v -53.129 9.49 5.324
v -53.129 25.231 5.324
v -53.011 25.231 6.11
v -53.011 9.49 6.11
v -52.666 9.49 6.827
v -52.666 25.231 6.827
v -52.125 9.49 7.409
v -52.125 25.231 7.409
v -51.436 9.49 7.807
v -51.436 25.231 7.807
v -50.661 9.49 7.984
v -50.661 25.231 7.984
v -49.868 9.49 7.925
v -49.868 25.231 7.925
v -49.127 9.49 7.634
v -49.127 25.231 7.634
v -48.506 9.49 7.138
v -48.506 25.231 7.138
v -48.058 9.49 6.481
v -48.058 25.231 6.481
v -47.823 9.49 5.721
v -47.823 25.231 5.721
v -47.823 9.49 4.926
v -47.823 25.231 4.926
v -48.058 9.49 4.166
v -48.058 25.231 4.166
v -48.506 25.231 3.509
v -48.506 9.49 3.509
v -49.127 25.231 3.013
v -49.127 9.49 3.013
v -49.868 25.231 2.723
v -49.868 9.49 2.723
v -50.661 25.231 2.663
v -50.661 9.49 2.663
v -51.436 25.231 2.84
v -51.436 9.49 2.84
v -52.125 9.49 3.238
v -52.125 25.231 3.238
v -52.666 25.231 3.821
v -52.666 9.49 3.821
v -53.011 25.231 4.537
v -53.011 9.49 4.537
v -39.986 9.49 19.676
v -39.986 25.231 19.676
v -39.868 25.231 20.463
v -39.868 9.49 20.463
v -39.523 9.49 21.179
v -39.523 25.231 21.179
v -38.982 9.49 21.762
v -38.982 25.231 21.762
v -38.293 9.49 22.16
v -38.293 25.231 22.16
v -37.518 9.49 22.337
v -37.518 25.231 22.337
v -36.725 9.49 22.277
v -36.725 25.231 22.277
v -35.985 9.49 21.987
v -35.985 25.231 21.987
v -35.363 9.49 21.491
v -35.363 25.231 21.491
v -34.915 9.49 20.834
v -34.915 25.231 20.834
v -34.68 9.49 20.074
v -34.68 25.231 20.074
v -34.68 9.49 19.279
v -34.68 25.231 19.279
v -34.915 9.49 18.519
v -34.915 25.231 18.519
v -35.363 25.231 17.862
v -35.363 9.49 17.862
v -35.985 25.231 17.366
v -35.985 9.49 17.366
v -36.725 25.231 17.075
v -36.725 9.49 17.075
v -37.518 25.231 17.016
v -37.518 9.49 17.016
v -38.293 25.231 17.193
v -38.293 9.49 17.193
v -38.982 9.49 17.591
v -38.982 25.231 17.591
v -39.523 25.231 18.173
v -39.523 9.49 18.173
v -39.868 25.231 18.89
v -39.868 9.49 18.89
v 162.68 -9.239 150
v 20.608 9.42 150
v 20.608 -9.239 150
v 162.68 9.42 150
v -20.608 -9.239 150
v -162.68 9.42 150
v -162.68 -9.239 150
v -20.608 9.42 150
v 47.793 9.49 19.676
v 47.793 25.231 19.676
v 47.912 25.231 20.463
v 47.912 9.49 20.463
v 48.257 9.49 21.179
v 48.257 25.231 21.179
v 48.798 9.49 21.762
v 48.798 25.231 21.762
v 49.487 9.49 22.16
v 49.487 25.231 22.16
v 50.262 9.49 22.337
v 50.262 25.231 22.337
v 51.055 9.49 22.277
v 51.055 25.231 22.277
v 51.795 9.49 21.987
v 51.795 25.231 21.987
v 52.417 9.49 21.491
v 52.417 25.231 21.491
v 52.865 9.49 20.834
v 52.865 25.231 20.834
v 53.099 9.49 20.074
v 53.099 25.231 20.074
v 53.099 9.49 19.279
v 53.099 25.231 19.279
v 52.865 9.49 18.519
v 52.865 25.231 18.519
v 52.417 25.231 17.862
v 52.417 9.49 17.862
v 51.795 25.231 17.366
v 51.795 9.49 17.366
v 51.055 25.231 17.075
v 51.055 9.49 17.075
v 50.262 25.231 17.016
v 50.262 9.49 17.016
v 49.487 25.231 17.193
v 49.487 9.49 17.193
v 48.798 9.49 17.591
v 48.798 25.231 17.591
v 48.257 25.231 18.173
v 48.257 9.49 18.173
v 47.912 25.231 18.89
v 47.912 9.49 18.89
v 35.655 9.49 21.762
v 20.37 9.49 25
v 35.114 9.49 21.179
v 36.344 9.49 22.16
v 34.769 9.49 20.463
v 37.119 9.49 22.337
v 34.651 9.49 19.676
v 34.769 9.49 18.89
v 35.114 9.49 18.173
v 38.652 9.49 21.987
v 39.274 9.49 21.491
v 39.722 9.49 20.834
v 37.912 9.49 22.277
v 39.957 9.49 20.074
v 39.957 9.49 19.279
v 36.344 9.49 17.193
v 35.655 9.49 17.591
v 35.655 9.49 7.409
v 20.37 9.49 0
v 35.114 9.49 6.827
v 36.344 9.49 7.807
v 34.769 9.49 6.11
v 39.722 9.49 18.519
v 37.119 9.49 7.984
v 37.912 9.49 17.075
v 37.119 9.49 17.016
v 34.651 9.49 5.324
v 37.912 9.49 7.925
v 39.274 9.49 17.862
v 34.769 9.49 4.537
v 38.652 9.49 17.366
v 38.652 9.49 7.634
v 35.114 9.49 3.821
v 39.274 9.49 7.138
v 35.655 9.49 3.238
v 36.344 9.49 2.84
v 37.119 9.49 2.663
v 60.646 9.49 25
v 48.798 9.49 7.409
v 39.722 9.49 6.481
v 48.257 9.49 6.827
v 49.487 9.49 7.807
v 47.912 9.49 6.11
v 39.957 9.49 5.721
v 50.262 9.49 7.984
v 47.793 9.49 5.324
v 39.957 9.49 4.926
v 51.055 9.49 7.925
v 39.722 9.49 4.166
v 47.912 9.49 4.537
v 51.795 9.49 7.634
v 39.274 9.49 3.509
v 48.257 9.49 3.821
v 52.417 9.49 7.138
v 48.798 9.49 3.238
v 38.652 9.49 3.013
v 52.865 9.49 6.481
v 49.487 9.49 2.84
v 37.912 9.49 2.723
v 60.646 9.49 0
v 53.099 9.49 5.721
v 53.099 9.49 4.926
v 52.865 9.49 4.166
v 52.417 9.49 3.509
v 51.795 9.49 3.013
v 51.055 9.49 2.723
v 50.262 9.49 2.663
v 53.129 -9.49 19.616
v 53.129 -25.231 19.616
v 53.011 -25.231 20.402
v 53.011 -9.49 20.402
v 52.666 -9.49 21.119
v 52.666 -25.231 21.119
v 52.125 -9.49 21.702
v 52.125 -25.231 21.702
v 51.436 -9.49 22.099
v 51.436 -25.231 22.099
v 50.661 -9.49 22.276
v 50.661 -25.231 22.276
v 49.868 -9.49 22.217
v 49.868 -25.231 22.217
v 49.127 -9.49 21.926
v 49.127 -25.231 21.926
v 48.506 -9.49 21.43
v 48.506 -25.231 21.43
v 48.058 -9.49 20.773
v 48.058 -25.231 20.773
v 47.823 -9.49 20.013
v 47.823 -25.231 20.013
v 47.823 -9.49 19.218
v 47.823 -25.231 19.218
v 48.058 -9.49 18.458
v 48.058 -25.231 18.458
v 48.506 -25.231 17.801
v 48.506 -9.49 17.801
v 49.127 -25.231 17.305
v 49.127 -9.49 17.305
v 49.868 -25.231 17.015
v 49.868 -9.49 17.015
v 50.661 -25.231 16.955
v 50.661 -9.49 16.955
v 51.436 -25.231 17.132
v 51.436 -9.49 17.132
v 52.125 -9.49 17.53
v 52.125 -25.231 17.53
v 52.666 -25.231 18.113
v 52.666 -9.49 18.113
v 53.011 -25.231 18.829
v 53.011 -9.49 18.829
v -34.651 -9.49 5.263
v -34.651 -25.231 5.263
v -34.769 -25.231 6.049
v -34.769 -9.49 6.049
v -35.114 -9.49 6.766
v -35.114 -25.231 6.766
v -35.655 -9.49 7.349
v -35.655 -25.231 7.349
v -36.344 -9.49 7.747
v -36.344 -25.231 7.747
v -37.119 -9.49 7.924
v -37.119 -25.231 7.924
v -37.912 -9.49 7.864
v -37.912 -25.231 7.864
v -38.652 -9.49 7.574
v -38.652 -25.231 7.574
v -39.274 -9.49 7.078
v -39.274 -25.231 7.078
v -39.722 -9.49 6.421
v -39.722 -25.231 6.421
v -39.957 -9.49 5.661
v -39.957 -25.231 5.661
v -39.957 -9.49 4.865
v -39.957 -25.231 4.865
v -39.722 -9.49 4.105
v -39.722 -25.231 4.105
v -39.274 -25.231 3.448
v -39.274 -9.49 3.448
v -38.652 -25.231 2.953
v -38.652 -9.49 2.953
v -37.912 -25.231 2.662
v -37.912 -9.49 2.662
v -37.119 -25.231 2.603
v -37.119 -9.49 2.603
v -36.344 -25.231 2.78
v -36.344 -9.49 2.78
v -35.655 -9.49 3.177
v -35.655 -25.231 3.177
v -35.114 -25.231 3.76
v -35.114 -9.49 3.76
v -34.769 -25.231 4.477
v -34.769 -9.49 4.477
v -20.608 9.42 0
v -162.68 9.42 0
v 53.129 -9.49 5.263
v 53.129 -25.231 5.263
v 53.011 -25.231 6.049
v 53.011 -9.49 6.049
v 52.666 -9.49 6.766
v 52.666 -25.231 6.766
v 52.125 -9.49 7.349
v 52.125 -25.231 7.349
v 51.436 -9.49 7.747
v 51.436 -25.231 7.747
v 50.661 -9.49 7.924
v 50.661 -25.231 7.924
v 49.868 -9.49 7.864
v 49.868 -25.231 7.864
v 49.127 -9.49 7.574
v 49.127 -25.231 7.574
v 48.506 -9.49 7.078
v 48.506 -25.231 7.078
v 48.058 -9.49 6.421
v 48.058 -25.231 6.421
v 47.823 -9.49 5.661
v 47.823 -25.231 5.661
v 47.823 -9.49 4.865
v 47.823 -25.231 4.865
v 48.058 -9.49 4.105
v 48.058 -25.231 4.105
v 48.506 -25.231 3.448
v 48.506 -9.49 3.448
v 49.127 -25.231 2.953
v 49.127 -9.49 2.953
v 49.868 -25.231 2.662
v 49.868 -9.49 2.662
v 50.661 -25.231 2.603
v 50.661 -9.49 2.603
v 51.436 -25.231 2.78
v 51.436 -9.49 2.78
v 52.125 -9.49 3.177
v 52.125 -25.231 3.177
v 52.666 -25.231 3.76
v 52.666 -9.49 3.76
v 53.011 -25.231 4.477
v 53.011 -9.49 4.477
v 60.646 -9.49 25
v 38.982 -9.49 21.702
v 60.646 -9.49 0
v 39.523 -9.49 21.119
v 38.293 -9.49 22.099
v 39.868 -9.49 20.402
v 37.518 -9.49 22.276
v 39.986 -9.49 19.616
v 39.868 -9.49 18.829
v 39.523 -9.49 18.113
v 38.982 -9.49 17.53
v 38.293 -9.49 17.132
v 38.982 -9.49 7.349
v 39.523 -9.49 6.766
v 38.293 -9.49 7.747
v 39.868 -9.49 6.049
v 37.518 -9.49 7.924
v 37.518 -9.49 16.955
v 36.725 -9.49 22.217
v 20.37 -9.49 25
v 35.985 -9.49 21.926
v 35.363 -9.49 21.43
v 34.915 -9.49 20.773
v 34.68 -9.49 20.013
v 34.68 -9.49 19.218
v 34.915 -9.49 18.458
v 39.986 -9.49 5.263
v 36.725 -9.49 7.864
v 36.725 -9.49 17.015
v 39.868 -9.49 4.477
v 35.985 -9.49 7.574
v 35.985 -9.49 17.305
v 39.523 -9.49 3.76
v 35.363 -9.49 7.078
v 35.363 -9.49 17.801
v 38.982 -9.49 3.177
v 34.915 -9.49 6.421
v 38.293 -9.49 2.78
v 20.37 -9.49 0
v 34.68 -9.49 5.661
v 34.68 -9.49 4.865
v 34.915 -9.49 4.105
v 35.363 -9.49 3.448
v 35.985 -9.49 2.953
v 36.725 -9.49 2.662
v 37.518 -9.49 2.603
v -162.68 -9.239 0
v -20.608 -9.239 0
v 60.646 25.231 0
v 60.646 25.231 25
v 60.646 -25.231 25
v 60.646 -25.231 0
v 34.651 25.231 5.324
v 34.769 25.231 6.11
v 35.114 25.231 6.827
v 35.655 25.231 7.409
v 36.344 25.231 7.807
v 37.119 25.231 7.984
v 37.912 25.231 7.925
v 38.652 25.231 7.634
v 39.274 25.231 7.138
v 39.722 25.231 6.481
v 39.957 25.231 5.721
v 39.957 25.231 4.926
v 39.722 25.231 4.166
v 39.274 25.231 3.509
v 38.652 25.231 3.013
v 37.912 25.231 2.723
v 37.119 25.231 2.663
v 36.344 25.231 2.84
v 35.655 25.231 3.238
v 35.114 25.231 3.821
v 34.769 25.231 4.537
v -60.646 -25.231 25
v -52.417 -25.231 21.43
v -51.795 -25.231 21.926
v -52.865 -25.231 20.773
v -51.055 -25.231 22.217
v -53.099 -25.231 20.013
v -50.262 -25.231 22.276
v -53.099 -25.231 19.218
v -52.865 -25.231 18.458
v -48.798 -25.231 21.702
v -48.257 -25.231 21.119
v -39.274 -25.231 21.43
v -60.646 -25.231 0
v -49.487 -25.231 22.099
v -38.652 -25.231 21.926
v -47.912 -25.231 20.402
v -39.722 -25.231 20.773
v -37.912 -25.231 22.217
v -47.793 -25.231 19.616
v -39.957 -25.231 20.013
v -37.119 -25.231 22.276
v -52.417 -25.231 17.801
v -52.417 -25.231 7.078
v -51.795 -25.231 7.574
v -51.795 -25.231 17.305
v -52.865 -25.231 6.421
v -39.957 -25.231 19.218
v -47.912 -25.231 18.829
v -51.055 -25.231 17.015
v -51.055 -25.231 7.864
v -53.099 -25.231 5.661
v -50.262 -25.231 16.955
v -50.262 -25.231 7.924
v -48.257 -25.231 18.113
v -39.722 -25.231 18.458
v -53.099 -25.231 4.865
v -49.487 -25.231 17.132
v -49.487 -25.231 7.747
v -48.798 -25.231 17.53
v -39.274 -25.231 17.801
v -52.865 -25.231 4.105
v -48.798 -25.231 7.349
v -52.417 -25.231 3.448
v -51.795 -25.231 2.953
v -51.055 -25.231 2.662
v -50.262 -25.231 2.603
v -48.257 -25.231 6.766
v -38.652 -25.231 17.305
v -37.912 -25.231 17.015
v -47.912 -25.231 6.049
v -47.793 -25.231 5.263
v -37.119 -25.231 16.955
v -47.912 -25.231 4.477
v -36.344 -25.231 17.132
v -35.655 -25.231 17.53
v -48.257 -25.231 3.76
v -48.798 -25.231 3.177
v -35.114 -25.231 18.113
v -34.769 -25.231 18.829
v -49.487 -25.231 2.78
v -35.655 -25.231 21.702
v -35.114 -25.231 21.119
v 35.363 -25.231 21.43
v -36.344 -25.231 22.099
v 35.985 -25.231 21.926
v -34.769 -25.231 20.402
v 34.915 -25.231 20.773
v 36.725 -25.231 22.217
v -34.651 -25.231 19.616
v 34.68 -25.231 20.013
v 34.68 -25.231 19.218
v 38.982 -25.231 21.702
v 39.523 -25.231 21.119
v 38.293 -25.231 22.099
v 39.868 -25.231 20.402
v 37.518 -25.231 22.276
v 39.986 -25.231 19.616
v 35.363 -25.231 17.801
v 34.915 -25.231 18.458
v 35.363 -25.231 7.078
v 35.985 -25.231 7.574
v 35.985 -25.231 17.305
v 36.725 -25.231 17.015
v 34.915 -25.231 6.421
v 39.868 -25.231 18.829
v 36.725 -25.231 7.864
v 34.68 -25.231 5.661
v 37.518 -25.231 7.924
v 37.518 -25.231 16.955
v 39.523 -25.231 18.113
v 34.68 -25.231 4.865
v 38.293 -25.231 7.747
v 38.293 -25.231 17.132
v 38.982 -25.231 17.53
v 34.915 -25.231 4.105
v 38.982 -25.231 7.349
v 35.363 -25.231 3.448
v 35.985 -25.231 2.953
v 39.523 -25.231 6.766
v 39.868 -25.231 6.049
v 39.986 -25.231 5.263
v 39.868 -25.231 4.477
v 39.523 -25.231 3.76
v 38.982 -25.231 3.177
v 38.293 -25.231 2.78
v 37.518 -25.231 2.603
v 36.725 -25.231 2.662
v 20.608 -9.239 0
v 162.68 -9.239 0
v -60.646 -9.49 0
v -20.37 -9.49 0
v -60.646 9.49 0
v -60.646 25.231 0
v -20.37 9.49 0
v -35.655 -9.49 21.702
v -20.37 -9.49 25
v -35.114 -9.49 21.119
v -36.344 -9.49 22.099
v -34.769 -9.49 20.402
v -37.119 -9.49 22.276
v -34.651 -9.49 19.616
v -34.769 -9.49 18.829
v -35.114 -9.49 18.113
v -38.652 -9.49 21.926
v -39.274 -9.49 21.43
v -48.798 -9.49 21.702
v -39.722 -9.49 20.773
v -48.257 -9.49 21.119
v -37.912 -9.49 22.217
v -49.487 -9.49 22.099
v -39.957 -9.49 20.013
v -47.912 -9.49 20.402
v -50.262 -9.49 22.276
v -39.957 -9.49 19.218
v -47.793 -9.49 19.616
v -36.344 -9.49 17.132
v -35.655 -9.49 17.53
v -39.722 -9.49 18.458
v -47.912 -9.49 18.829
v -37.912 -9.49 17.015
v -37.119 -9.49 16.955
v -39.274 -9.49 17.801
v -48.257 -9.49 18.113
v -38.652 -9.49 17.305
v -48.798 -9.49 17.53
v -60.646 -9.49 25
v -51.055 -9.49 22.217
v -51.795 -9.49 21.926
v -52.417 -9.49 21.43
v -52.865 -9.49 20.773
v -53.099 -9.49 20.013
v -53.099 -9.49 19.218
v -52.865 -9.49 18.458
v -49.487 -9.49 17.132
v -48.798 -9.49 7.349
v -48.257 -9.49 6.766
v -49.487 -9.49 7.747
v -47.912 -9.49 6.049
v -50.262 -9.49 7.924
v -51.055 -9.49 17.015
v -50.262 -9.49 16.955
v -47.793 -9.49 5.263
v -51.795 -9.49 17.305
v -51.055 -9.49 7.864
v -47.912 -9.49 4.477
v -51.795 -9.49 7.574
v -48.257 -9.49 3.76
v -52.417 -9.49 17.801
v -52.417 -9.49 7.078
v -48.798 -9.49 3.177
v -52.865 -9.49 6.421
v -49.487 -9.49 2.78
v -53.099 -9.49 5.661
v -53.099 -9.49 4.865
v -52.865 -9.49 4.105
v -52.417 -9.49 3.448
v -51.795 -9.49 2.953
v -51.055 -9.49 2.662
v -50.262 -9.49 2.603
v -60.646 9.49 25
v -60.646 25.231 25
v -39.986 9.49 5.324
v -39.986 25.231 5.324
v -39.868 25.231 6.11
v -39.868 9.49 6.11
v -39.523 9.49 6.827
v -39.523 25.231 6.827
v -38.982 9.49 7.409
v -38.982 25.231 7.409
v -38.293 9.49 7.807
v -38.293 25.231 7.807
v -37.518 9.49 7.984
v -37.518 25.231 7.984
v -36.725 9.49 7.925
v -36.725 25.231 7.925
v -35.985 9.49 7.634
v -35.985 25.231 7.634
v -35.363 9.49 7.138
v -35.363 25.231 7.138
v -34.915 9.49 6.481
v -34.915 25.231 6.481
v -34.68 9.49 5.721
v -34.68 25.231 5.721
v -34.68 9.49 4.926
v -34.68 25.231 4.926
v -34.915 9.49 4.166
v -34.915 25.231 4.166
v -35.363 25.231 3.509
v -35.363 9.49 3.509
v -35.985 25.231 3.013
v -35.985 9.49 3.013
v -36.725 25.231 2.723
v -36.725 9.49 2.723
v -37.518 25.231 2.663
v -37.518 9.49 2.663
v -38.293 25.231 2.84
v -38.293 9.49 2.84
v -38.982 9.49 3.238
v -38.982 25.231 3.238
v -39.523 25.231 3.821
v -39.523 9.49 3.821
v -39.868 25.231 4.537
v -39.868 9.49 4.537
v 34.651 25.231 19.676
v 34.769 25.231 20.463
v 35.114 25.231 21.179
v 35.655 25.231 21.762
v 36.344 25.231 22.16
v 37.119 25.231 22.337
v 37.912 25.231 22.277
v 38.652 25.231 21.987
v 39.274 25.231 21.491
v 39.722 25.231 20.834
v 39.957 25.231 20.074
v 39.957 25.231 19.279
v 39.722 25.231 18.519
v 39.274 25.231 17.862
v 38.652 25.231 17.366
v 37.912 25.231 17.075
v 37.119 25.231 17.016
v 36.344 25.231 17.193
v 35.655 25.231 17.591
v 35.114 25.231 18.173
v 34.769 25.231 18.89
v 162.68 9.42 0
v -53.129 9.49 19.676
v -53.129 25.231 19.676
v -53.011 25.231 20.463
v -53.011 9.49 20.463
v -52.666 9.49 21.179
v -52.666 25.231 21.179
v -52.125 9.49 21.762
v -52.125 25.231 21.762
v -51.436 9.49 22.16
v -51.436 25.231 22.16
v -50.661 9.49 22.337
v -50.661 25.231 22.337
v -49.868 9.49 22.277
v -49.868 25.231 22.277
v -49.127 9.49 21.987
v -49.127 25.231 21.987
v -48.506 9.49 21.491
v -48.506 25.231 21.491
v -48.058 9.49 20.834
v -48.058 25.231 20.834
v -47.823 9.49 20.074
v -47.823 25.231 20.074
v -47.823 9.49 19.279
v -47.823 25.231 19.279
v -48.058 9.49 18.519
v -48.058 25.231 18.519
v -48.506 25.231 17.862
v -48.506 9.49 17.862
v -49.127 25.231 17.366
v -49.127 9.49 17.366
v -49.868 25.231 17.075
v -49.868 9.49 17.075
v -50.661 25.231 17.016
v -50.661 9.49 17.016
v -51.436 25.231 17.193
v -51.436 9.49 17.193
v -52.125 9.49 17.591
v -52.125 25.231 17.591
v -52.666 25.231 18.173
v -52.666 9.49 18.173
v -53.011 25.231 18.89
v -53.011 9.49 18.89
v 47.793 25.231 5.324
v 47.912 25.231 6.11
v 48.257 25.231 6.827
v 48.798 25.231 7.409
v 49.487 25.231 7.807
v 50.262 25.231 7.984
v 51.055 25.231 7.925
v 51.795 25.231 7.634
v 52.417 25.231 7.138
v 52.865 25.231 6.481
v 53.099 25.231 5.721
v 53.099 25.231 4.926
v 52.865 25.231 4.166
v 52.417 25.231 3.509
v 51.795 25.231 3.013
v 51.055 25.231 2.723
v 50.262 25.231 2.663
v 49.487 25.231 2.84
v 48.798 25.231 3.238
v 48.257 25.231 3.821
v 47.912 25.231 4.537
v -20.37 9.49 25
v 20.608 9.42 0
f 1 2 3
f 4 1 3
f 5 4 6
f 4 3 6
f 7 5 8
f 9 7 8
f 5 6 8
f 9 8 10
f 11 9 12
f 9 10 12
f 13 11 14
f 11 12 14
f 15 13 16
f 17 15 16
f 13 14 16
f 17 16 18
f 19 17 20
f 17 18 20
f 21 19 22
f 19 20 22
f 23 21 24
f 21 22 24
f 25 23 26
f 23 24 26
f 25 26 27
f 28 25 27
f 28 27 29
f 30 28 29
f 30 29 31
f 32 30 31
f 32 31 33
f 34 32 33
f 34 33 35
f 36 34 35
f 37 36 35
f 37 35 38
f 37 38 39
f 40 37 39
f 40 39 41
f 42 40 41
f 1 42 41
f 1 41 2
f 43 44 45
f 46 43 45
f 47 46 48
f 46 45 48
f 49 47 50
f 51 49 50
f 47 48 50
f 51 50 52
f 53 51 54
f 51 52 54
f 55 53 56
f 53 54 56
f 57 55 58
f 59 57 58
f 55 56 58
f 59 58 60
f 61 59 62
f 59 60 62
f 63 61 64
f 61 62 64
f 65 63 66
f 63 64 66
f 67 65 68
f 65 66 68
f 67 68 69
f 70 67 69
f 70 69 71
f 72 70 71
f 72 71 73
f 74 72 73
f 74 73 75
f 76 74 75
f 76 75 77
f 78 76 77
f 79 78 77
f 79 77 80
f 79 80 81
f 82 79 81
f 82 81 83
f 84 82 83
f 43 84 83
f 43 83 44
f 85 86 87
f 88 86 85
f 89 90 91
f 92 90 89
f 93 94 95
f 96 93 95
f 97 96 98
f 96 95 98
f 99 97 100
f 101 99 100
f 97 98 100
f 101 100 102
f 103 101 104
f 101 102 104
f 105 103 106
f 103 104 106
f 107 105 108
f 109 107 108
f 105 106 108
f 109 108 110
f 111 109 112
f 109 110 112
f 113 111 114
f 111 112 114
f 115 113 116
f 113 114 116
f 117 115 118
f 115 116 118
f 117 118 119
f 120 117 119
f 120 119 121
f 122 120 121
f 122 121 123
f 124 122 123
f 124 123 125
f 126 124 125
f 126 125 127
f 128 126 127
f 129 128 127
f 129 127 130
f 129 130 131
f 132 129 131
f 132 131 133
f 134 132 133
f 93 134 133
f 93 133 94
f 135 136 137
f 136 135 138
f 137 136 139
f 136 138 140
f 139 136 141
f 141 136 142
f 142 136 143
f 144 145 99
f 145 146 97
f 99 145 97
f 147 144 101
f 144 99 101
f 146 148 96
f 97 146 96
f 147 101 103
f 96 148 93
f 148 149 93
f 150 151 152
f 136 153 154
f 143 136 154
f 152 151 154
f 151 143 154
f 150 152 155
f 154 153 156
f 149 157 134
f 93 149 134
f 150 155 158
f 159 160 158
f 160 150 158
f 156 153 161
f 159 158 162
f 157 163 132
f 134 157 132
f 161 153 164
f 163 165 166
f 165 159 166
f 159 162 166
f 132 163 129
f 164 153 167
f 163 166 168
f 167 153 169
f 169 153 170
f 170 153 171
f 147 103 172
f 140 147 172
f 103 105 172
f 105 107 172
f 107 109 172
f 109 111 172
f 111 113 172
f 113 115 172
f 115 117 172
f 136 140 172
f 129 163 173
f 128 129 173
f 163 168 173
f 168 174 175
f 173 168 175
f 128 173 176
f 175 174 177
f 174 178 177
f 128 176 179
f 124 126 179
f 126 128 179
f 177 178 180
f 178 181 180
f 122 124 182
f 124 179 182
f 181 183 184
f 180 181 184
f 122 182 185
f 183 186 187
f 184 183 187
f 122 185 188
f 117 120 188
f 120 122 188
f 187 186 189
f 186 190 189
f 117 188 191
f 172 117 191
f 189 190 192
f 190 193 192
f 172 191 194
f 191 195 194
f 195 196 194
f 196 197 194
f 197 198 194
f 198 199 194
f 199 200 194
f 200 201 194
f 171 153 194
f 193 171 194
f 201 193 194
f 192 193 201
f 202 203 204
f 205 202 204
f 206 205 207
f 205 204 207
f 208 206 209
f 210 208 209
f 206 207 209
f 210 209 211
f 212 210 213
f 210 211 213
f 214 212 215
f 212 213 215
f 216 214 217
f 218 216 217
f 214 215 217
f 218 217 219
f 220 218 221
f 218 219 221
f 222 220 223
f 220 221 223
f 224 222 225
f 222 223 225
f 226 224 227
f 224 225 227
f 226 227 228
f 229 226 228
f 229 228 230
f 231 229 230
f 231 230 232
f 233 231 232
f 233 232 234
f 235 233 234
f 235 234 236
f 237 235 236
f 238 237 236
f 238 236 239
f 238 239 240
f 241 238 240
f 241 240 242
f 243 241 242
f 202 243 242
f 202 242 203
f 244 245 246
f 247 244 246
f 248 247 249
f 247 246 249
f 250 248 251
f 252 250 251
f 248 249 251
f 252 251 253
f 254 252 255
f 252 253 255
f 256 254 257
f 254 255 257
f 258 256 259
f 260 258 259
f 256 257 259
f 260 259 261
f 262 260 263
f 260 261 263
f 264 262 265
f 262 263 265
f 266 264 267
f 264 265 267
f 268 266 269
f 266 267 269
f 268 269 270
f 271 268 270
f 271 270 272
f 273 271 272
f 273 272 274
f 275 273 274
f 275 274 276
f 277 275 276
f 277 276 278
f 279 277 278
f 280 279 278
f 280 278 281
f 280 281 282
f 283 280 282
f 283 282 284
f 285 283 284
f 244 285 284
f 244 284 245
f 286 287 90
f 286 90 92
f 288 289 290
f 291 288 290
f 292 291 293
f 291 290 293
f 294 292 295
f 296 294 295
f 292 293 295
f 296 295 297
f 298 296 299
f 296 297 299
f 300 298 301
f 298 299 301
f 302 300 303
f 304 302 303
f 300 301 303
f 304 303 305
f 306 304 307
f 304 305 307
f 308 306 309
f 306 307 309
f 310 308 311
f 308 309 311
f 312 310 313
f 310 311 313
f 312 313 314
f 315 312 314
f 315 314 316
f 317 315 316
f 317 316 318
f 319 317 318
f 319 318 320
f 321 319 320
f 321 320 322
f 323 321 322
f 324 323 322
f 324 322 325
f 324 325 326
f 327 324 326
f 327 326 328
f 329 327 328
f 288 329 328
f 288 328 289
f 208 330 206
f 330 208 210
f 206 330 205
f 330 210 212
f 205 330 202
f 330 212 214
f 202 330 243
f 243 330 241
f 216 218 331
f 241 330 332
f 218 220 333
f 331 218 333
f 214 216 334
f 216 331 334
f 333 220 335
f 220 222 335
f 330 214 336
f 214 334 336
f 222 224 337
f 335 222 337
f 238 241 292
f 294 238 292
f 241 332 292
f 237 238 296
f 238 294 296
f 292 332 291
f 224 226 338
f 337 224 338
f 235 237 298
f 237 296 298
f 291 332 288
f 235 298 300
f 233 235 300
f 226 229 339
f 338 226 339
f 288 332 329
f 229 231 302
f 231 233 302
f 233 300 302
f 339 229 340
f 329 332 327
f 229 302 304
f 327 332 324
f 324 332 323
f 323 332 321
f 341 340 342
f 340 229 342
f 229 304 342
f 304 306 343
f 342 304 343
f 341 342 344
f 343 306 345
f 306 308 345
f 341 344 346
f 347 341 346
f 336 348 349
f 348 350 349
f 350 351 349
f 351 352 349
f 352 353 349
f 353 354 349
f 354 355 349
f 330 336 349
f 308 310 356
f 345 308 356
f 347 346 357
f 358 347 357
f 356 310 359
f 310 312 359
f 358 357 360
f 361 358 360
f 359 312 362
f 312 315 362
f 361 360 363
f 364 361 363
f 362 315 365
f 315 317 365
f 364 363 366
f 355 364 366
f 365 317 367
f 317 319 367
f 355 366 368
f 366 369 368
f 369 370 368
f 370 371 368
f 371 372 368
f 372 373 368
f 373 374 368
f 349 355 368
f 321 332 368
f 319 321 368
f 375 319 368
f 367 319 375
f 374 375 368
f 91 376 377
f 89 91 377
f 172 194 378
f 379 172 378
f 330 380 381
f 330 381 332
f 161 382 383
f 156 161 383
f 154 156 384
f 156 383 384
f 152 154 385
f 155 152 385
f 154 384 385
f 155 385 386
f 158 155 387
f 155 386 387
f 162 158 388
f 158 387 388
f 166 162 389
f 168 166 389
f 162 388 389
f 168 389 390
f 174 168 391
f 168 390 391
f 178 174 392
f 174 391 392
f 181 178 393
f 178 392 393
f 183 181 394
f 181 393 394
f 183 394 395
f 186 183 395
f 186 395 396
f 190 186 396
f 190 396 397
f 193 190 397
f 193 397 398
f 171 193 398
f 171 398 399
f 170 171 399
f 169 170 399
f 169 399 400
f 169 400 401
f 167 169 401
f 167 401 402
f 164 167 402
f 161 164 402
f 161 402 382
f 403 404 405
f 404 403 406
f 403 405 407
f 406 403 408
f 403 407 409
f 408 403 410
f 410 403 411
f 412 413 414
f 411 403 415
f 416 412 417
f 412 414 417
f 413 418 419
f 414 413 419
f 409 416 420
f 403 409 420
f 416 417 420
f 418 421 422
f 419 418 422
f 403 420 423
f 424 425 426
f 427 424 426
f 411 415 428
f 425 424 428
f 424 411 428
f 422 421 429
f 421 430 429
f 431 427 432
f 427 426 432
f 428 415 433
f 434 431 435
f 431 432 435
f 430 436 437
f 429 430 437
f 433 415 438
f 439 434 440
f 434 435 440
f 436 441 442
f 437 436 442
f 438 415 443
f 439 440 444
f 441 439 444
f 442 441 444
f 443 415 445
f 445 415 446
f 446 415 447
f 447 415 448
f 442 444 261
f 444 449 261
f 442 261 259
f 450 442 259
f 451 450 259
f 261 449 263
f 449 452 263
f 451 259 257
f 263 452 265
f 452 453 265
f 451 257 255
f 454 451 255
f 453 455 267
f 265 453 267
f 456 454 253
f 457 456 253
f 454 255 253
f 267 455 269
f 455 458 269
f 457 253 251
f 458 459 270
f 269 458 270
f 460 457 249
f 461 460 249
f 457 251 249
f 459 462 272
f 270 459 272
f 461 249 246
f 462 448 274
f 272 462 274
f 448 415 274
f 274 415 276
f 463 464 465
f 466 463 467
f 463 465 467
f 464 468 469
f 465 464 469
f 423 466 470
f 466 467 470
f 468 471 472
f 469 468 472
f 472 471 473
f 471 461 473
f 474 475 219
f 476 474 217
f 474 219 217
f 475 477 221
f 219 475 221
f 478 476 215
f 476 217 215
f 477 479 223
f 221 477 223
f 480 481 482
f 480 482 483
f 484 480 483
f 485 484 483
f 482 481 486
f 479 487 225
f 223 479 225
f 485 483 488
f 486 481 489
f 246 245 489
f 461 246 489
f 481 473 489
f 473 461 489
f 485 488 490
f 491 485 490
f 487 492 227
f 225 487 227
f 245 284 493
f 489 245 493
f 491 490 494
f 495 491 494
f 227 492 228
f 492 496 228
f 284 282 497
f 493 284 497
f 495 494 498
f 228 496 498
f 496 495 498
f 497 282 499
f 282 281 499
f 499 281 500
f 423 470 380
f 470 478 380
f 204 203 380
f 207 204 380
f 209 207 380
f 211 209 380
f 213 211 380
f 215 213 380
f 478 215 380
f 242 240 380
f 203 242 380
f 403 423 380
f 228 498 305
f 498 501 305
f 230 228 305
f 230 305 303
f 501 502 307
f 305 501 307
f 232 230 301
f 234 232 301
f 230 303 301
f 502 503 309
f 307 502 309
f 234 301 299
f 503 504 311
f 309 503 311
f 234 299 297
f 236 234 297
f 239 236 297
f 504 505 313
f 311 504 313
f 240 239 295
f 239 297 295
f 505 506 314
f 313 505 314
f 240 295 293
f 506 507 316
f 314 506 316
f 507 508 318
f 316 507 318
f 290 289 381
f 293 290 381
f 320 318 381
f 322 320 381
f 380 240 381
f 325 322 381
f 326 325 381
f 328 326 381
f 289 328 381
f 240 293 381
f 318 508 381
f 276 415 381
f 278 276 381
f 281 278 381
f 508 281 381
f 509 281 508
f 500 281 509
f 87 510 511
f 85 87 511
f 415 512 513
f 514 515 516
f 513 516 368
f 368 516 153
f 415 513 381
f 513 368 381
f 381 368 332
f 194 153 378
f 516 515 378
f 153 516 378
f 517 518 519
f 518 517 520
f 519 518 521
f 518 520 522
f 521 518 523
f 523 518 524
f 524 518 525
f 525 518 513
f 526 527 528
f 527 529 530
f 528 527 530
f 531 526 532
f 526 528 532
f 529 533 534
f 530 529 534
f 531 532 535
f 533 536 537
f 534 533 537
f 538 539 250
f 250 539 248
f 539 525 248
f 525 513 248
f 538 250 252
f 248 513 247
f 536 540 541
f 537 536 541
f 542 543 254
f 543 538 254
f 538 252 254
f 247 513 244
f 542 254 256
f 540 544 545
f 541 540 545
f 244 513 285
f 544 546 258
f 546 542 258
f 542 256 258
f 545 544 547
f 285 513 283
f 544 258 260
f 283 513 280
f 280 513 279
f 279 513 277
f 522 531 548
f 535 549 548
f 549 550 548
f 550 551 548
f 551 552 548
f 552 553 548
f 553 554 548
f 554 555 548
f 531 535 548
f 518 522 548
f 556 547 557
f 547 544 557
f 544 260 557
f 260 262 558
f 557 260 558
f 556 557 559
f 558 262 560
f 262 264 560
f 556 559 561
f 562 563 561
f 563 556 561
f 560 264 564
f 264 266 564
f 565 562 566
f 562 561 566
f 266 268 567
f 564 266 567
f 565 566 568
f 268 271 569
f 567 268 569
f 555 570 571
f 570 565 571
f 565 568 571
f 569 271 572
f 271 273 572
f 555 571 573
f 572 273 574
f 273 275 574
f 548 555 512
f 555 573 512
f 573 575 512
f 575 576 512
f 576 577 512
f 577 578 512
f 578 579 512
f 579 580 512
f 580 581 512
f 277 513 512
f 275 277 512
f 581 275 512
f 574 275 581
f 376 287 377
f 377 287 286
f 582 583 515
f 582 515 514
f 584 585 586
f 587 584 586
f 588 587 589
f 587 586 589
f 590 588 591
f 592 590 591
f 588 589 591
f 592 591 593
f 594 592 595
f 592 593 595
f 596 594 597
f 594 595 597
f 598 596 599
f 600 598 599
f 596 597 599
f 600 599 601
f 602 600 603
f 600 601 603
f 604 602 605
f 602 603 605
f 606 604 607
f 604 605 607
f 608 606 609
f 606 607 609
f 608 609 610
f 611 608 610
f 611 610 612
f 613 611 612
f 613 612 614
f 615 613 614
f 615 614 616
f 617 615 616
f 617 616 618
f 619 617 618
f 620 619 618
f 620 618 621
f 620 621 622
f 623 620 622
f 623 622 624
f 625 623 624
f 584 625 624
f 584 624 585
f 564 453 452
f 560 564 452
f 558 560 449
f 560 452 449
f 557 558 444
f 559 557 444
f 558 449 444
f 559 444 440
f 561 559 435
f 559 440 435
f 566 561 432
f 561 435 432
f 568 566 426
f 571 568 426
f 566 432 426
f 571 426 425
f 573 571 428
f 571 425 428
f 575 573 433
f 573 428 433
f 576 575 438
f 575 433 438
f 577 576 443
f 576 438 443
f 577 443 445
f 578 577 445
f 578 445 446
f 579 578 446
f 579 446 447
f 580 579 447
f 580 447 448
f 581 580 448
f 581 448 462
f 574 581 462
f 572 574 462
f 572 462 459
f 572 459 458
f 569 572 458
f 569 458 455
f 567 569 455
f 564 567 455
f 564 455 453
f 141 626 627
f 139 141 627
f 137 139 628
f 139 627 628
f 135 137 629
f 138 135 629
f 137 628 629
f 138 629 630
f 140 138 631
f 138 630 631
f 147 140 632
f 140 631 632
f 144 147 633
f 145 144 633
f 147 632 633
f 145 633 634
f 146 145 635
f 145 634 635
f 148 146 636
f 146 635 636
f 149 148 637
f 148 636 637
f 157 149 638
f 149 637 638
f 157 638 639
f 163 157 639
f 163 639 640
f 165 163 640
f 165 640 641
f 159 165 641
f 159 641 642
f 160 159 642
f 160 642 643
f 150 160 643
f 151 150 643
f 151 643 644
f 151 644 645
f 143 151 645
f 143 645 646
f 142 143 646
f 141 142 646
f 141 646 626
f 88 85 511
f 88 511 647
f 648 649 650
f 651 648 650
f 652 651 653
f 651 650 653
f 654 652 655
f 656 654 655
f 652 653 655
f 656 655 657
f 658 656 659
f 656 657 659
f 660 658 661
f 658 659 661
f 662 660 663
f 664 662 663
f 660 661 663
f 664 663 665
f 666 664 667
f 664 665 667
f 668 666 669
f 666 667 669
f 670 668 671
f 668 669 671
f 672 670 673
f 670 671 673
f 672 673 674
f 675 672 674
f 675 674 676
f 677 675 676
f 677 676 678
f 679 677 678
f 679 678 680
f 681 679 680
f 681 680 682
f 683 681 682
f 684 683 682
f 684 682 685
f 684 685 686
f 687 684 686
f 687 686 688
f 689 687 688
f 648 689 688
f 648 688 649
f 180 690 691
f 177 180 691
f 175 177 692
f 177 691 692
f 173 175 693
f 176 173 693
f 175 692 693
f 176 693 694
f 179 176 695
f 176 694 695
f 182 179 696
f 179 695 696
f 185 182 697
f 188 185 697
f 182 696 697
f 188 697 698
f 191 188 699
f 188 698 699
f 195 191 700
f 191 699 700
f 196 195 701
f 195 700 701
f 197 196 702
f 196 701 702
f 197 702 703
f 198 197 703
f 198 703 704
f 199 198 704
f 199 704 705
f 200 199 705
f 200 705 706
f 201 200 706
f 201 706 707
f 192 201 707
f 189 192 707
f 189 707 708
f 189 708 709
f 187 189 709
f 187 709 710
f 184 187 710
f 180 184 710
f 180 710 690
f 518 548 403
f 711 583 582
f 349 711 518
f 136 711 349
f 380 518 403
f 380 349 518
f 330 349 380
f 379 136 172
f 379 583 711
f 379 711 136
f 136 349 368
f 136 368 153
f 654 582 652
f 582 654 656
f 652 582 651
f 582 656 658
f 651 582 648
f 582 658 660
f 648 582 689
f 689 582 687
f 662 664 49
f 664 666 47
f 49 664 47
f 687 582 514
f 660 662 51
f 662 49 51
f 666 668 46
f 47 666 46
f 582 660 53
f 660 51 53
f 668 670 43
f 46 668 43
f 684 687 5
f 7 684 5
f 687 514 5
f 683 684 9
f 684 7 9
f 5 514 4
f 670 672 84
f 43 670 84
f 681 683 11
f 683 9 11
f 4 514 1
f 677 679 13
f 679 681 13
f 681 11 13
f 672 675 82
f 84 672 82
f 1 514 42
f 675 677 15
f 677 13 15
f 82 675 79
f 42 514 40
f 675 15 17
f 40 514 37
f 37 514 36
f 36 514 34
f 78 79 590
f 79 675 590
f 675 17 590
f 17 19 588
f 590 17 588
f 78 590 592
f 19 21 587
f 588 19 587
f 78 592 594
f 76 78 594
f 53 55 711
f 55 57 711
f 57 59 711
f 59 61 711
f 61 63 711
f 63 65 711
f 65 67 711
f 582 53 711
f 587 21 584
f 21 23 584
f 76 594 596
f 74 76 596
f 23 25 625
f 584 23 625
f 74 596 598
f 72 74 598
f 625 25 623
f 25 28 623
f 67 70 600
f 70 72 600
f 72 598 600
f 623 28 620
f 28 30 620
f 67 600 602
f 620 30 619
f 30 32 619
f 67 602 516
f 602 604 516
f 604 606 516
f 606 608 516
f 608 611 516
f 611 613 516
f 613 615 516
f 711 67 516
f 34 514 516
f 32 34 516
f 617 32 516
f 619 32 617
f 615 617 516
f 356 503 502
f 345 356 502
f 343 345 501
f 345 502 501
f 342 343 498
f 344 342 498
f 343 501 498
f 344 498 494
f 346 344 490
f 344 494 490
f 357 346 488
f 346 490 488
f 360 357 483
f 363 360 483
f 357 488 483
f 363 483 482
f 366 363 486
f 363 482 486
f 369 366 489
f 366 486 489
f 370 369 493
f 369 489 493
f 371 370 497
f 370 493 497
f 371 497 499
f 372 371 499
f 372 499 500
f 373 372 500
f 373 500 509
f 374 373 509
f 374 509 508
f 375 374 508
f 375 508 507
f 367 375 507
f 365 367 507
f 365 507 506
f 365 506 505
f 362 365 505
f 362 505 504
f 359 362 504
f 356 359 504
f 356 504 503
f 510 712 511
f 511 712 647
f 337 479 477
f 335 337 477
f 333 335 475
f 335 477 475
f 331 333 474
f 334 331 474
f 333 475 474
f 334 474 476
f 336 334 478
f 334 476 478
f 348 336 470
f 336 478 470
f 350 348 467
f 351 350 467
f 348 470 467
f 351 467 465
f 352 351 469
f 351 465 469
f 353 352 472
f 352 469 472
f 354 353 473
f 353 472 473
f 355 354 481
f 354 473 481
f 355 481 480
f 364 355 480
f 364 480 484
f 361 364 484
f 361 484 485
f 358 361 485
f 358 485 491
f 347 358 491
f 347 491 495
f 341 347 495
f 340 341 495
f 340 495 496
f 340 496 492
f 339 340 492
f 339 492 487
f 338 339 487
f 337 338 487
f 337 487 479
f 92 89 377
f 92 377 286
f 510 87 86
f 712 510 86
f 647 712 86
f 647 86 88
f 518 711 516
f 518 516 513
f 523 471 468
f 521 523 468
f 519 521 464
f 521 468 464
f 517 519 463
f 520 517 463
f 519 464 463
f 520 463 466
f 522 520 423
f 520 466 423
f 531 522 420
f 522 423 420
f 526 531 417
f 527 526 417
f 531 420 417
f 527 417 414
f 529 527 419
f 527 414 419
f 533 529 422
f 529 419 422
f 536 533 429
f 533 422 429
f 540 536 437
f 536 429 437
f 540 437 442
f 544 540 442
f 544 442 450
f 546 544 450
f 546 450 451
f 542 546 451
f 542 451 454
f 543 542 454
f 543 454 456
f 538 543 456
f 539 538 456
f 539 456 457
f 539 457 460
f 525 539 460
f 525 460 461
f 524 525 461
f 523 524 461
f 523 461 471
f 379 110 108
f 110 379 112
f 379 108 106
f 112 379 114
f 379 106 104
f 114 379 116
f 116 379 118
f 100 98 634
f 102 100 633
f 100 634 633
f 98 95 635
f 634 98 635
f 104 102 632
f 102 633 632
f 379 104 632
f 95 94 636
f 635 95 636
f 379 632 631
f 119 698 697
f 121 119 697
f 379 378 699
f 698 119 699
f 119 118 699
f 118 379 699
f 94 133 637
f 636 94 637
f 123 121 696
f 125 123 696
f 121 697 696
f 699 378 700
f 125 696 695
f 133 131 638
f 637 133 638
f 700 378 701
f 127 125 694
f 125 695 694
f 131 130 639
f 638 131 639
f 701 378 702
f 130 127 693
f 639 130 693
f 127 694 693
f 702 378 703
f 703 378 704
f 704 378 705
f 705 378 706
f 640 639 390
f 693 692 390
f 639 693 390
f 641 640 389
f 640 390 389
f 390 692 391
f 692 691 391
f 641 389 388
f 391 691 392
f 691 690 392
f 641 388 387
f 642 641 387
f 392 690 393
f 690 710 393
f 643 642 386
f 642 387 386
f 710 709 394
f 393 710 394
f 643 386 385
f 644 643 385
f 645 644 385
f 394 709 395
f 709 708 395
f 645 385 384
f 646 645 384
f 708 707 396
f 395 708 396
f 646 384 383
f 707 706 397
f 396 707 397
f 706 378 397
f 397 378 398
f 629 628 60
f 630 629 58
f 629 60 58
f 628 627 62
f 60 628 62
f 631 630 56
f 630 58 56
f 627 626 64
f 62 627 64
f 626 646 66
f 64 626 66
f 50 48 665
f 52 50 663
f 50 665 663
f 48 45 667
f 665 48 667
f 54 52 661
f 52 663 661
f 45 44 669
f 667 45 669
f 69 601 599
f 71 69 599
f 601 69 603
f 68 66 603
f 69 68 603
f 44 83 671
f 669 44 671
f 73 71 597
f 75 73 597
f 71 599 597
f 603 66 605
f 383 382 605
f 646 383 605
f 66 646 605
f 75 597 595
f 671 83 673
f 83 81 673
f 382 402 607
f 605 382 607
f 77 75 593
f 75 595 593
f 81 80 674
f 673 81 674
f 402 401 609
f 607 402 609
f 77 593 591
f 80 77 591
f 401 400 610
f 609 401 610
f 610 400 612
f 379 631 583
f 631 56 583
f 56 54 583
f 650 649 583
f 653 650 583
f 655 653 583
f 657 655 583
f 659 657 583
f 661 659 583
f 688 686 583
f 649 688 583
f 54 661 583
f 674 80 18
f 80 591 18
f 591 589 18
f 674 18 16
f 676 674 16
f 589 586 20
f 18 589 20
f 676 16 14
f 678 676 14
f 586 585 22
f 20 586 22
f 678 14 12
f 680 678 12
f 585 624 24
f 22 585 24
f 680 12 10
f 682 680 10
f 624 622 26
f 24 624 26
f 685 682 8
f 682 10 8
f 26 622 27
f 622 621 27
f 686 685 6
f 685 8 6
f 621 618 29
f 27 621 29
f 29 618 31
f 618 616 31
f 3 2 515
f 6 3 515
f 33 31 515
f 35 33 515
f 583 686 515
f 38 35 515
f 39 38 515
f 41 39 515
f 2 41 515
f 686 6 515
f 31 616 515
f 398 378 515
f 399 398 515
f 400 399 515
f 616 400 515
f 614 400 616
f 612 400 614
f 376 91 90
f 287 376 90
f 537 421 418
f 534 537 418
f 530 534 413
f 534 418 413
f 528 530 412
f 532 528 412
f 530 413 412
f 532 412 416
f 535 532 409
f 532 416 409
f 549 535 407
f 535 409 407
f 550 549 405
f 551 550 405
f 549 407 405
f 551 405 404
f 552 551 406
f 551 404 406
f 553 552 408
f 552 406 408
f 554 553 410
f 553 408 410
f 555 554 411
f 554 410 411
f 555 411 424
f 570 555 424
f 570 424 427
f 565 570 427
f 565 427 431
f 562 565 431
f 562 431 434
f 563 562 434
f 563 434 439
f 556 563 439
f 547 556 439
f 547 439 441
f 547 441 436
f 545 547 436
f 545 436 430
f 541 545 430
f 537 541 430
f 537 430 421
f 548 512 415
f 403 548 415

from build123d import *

# Parameters (mm, degrees)
F1_DEPTH = 25
F2_R     = 2.667913
F3_DEPTH = 25
F4_R     = 2.667913
F5_DEPTH = 25
F6_W     = 142.071443
F6_H     = 18.659153
F7_DEPTH = 150
F8_DEPTH = 150


with BuildPart() as f1:
    # F0 (on Top) → F1 (new body)
    with BuildSketch(Plane.XY):
        Polygon((-60.646169, 9.490431), (-20.369707, 9.490431), (-20.369707, -9.490431), (-60.646169, -9.490431), (-60.646169, -25.230657), (0, -25.230657), (60.646169, -25.230657), (60.646169, -9.490431), (20.369707, -9.490431), (20.369707, 9.490431), (60.646169, 9.490431), (60.646169, 25.230657), (0, 25.230657), (-60.646169, 25.230657), align=None)
    extrude(amount=F1_DEPTH)

    # F2 (on face) → F3 (cut)
    with BuildSketch(Plane(origin=(0, 25.230657, 0), x_dir=(-1, 0, 0), z_dir=(0, 1, 0))):
        with Locations((50.461315, 5.323622)):
            Circle(F2_R)
        with Locations((37.318457, 5.323622)):
            Circle(F2_R)
        with Locations((50.461315, 19.676378)):
            Circle(F2_R)
        with Locations((37.318457, 19.676378)):
            Circle(F2_R)
        with Locations((-37.318457, 5.323622)):
            Circle(F2_R)
        with Locations((-50.461315, 5.323622)):
            Circle(F2_R)
        with Locations((-50.461315, 19.676378)):
            Circle(F2_R)
        with Locations((-37.318457, 19.676378)):
            Circle(F2_R)
    extrude(amount=-F3_DEPTH, mode=Mode.SUBTRACT)

    # F4 (on face) → F5 (cut)
    with BuildSketch(Plane.XZ.offset(25.230657)):
        with Locations((50.461315, 5.263057)):
            Circle(F4_R)
        with Locations((50.461315, 19.615812)):
            Circle(F4_R)
        with Locations((37.318457, 5.263057)):
            Circle(F4_R)
        with Locations((37.318457, 19.615812)):
            Circle(F4_R)
        with Locations((-37.318457, 5.263057)):
            Circle(F4_R)
        with Locations((-37.318457, 19.615812)):
            Circle(F4_R)
        with Locations((-50.461315, 5.263057)):
            Circle(F4_R)
        with Locations((-50.461315, 19.615812)):
            Circle(F4_R)
    extrude(amount=-F5_DEPTH, mode=Mode.SUBTRACT)


with BuildPart() as f7:
    # F6 (on Top) → F7 (new body)
    with BuildSketch(Plane.XY):
        with Locations((-91.644174, 0.090787)):
            Rectangle(F6_W, F6_H)
    extrude(amount=F7_DEPTH)


with BuildPart() as f8:
    # F6 (on Top) → F8 (new body)
    with BuildSketch(Plane.XY):
        with Locations((91.644174, 0.090787)):
            Rectangle(F6_W, F6_H)
    extrude(amount=F8_DEPTH)


solid = Compound([f1.part, f7.part, f8.part])
